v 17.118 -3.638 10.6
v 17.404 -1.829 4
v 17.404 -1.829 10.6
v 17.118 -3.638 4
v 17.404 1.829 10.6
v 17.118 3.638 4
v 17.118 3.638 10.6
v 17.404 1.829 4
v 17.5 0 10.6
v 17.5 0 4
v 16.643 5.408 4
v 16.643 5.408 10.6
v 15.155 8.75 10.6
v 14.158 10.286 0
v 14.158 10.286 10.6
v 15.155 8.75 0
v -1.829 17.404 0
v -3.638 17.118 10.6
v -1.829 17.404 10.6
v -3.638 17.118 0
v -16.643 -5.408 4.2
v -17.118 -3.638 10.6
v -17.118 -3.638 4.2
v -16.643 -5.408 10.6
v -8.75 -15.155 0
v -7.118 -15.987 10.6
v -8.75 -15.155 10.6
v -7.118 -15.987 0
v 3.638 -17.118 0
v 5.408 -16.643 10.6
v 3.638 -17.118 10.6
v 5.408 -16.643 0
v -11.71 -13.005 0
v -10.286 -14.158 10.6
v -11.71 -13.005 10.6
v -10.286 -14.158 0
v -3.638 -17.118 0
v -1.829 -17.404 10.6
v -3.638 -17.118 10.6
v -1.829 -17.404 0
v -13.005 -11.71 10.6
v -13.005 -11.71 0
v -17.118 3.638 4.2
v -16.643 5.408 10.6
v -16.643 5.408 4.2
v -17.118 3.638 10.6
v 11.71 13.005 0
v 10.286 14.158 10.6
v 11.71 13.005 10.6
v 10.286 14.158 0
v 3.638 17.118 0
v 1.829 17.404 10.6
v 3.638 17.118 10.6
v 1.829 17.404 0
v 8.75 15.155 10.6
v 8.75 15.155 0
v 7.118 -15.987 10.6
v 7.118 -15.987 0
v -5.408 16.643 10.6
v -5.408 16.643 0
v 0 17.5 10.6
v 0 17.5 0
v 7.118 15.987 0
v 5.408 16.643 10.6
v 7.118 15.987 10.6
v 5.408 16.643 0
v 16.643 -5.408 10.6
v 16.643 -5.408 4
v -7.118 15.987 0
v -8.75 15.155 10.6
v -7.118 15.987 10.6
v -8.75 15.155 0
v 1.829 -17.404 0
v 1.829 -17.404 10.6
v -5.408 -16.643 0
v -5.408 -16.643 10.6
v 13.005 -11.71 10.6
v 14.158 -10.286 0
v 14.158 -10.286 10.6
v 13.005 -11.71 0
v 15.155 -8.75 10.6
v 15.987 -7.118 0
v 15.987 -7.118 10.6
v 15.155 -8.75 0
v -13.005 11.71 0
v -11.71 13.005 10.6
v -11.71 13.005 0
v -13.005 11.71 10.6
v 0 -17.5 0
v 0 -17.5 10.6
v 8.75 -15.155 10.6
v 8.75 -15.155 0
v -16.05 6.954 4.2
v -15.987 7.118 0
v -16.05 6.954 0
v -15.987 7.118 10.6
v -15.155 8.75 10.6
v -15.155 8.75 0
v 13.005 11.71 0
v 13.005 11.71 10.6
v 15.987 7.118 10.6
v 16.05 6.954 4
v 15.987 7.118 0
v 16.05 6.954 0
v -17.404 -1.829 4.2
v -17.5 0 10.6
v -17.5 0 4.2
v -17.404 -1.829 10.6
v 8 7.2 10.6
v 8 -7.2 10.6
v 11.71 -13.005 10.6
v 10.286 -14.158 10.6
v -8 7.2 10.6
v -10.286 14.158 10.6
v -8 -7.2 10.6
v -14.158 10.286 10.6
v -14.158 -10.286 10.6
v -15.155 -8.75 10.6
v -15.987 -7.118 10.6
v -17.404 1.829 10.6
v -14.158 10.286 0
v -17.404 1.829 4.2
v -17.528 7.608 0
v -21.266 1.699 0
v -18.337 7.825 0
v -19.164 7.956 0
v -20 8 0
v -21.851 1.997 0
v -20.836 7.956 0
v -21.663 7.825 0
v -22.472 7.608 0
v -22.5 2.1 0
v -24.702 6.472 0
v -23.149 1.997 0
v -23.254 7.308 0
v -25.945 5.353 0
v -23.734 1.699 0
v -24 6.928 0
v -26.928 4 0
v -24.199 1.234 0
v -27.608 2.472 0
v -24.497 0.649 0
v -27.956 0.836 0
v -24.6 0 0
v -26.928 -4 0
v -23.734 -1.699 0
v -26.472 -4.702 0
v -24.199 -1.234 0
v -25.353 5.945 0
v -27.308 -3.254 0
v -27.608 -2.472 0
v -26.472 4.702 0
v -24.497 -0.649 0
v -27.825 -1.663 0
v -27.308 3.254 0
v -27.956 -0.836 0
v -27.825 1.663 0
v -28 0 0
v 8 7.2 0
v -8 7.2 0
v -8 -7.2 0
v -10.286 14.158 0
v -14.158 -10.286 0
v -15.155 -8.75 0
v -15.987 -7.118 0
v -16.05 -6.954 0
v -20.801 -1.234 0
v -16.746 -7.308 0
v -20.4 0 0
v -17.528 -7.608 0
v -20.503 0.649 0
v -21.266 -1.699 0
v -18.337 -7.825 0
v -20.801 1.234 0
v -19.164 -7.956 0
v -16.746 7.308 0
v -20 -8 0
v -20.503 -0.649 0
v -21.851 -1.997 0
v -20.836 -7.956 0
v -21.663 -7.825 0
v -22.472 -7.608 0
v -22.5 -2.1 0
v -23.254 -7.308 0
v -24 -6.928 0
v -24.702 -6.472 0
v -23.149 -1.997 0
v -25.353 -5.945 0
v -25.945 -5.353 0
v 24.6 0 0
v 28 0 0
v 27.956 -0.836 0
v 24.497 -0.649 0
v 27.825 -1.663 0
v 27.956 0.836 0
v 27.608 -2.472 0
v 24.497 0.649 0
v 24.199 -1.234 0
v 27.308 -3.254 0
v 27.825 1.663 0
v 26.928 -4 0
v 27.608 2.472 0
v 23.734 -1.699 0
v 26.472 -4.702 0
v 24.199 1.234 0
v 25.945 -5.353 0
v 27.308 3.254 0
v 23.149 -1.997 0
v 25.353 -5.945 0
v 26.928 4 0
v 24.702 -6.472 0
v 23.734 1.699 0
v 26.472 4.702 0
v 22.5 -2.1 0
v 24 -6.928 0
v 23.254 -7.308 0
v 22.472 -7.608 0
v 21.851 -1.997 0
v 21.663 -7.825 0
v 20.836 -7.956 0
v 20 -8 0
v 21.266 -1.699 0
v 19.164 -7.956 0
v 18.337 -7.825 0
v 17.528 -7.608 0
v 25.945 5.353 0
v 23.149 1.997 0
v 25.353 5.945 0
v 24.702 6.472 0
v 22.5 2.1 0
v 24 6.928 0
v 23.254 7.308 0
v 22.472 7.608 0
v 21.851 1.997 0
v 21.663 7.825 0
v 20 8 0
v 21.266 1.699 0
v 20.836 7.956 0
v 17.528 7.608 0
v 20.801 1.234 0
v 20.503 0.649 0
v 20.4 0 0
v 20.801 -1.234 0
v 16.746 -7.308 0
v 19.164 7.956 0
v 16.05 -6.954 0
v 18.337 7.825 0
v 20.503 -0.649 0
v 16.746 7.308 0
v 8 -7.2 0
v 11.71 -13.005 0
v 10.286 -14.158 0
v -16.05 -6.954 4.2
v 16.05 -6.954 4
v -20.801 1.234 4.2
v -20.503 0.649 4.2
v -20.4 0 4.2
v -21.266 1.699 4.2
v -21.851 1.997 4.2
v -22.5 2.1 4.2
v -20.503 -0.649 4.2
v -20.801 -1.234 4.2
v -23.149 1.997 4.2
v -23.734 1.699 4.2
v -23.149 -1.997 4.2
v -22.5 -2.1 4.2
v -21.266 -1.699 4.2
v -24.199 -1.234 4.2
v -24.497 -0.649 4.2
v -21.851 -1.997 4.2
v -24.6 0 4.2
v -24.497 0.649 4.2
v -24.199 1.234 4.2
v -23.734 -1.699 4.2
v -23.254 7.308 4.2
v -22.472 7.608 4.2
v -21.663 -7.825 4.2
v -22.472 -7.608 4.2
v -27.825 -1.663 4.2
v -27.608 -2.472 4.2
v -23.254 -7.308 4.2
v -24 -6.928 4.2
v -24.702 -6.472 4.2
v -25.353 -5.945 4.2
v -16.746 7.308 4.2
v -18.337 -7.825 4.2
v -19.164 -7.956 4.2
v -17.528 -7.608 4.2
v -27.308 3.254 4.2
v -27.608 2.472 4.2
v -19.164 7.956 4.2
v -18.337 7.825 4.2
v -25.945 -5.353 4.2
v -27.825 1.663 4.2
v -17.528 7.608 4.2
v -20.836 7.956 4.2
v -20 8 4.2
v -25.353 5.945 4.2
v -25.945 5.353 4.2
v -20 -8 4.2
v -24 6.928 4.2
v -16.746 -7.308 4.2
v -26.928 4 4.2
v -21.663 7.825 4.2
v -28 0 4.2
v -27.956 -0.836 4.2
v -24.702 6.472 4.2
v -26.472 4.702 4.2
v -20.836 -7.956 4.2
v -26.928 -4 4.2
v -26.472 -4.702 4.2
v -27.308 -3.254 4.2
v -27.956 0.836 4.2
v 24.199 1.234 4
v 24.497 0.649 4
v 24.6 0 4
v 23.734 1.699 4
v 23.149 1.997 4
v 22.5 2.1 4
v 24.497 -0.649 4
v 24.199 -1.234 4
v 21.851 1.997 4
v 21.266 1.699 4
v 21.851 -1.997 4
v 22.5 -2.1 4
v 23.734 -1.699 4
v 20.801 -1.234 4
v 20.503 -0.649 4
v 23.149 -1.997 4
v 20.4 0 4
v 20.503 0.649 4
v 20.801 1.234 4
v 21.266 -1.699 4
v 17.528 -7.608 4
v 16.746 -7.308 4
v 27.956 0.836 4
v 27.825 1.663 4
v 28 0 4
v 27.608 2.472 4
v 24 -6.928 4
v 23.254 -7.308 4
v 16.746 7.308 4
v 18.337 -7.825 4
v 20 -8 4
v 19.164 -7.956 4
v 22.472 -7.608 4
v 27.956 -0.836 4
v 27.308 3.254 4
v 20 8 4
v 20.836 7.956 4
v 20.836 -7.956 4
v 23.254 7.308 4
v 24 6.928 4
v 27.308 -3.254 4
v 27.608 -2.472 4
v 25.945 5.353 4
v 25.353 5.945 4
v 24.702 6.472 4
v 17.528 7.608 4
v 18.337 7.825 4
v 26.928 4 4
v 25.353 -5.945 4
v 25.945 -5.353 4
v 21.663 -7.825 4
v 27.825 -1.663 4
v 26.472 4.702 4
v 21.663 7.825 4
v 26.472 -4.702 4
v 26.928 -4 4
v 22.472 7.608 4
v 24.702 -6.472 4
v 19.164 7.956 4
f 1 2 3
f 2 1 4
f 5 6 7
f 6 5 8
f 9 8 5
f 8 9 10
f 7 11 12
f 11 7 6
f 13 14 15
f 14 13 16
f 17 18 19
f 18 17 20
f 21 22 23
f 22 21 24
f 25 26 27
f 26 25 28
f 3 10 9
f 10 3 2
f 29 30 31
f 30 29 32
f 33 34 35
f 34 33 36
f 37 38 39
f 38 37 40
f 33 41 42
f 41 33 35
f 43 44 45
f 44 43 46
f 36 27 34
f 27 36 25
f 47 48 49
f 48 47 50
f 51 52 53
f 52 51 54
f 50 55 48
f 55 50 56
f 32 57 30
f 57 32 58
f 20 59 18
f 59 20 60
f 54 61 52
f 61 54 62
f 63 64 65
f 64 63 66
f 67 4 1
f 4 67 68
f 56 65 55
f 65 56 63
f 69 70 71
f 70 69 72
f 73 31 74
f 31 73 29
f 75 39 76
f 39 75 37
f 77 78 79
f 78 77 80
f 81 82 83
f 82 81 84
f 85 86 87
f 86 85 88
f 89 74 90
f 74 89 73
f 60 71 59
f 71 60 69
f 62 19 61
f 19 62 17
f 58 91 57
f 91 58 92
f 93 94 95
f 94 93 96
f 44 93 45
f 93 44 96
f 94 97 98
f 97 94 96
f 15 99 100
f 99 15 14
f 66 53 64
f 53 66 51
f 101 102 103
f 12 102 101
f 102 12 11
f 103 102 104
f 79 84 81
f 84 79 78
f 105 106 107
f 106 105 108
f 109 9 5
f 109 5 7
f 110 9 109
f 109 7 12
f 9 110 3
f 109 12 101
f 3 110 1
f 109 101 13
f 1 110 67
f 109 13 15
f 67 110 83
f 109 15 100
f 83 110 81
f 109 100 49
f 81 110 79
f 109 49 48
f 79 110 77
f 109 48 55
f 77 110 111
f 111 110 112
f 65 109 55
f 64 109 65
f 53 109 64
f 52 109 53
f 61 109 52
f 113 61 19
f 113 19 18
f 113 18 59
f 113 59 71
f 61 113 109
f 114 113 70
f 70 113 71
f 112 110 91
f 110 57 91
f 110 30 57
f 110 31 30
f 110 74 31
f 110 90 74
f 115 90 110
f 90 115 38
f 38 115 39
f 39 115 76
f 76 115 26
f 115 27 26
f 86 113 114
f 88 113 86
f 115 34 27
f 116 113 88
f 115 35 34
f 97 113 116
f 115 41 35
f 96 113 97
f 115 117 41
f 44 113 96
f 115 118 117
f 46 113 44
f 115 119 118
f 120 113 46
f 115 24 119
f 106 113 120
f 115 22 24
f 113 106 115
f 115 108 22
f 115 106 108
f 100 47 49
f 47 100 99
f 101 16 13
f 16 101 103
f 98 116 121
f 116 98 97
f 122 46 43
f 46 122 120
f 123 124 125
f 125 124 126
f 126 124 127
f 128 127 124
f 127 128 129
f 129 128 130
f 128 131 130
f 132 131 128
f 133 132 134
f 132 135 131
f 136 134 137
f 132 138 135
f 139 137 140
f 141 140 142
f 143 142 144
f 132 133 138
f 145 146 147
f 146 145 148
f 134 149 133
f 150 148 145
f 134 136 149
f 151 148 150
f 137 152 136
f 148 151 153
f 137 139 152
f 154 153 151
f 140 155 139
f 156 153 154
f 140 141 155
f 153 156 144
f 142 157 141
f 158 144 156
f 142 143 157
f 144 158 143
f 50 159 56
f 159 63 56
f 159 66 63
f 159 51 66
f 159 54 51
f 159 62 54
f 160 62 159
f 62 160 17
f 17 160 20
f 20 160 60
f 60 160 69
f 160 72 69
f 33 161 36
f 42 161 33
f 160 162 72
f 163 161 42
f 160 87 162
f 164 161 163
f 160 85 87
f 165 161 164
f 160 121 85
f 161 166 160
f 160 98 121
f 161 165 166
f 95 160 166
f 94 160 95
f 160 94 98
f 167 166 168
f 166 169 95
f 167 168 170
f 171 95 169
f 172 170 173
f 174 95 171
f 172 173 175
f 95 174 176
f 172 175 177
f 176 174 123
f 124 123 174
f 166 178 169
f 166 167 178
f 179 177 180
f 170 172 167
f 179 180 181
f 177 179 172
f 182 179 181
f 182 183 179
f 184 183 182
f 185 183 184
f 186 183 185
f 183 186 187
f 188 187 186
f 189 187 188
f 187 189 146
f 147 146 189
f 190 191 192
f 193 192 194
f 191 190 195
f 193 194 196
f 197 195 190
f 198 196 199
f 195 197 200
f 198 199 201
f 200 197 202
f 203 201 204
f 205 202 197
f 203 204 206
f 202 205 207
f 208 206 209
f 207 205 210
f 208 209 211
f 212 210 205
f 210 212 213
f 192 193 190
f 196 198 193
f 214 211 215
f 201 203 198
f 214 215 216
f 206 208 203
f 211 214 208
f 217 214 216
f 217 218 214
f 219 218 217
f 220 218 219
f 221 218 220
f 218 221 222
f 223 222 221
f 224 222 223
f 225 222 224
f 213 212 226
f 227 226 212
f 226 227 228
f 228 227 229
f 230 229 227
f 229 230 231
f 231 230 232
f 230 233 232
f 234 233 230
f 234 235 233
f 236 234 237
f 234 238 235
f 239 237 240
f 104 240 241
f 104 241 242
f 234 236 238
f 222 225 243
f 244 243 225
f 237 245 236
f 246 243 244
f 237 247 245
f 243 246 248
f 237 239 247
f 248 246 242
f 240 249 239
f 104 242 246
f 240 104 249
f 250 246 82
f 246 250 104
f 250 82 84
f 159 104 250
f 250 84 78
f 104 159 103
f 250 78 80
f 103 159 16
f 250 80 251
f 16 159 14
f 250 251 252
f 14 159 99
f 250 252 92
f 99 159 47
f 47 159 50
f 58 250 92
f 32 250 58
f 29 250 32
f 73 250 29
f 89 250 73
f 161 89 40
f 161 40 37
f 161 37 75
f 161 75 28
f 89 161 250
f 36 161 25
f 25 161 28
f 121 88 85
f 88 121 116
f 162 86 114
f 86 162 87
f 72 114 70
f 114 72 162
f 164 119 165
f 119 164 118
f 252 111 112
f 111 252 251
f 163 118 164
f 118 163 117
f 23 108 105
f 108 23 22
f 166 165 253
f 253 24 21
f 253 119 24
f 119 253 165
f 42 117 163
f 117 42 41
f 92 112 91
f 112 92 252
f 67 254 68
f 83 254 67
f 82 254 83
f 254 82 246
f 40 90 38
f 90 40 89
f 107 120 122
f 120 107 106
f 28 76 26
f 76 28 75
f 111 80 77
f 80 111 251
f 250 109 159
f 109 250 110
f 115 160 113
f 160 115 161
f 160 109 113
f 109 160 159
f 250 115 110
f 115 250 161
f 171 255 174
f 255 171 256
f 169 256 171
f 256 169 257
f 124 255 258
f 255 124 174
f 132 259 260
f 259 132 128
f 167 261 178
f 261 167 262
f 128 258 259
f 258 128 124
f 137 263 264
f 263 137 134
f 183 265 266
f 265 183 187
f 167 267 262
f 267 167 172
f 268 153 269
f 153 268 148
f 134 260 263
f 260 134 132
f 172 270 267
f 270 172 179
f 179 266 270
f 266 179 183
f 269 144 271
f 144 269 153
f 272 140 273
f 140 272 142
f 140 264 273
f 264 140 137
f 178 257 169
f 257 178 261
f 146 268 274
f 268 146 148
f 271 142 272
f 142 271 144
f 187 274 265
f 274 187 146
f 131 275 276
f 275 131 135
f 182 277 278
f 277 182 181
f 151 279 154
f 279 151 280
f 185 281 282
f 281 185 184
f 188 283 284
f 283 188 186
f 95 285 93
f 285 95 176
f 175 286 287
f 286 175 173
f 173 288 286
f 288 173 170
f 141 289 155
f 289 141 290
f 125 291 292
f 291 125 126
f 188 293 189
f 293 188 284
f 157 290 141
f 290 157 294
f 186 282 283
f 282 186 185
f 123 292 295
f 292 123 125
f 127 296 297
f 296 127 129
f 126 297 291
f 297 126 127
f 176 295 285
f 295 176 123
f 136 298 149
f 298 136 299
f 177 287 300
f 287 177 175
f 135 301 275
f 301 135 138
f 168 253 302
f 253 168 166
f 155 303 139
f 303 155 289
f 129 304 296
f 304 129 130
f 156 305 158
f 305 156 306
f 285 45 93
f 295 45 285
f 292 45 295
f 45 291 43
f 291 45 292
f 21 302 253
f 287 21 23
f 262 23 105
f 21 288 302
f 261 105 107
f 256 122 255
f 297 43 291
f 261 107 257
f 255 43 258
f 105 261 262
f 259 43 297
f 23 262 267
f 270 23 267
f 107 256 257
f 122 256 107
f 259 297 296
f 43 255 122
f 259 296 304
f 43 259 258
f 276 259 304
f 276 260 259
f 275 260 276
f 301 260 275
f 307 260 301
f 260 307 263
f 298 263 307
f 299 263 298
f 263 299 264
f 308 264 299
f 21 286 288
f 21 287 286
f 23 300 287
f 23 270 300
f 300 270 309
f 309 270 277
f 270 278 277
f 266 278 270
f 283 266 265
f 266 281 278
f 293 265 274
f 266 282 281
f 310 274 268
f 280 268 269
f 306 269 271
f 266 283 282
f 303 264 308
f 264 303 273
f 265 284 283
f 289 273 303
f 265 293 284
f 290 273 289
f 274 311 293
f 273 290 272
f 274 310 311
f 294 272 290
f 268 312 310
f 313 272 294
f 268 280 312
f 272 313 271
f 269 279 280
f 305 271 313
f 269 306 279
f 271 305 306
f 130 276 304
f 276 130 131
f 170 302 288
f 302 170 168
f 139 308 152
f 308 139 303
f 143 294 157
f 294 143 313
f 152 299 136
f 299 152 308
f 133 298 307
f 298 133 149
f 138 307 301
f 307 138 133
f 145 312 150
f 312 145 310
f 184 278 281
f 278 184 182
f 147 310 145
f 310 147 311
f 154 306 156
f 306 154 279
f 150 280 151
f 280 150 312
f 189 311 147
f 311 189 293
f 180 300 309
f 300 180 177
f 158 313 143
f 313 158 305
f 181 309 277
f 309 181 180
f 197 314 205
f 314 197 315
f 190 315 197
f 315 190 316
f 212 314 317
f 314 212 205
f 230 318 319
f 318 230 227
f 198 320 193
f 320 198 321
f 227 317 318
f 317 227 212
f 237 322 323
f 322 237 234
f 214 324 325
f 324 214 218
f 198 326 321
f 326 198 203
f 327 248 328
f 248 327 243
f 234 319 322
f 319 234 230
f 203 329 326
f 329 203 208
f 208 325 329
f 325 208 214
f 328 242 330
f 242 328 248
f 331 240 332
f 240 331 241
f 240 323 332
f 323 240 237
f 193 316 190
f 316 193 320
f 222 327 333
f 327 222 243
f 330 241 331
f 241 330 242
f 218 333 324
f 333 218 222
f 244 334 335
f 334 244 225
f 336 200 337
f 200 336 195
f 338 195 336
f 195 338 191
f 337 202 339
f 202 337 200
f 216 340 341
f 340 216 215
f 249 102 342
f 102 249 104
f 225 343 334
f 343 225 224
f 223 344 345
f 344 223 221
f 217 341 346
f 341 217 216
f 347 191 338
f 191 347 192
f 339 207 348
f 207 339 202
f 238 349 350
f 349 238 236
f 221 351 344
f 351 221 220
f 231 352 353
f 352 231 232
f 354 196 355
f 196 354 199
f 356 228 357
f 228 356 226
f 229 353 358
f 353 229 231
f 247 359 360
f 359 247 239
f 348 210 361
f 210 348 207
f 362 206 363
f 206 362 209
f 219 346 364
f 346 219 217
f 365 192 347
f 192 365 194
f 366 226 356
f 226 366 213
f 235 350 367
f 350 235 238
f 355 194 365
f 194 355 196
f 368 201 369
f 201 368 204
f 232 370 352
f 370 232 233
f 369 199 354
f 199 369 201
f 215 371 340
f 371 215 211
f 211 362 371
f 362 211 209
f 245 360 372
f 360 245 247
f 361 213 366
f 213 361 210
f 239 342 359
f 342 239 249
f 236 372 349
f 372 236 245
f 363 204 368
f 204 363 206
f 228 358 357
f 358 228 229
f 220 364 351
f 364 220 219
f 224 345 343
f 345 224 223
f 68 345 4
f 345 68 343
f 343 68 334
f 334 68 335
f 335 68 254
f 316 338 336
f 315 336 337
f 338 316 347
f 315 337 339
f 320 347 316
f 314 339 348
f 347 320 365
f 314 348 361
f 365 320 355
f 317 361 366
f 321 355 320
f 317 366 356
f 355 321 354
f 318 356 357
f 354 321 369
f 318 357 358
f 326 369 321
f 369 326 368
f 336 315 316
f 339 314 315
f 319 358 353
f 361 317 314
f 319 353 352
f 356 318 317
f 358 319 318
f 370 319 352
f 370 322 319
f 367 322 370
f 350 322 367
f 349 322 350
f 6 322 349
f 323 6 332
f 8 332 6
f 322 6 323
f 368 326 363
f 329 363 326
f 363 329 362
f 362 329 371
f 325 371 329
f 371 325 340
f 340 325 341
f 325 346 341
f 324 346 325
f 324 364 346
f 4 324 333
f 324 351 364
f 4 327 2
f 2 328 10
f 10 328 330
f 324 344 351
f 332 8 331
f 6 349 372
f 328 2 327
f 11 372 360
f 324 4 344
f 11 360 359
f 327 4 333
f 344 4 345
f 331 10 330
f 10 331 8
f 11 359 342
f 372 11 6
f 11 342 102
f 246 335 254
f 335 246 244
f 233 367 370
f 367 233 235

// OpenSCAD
      color("red")
      
difference()
{
cylinder(h=6.6+4, r=35/2, center=false, $fn=60);

translate([0,0,6])
	cube(size=[16,14.4,16], center=true);
}


difference()
{
translate([-40/2,0,0])
	cylinder(h=4.2, r=16/2, center=false, $fn=60);
translate([-45/2,0,-2])
	screw_hole(16,4.2,2.7,7.7);
}

difference()
{
translate([+40/2,0,0])
	cylinder(h=4, r=16/2, center=false, $fn=60);
translate([+45/2,0,-2])
	screw_hole(16,4.2,2.7,7.7);
}
module screw_hole(height,diam,head_height,head_diam)
{
	translate([0,0,-head_height])
	{
		translate([0,0,+height])
			cylinder(h=head_height, r1=diam/2,r2=head_diam/2, center=false, $fn=20);

		translate([0,0,+head_height])
			cylinder(height-head_height,r=diam/2,center=false, $fn=20);
	}
}
